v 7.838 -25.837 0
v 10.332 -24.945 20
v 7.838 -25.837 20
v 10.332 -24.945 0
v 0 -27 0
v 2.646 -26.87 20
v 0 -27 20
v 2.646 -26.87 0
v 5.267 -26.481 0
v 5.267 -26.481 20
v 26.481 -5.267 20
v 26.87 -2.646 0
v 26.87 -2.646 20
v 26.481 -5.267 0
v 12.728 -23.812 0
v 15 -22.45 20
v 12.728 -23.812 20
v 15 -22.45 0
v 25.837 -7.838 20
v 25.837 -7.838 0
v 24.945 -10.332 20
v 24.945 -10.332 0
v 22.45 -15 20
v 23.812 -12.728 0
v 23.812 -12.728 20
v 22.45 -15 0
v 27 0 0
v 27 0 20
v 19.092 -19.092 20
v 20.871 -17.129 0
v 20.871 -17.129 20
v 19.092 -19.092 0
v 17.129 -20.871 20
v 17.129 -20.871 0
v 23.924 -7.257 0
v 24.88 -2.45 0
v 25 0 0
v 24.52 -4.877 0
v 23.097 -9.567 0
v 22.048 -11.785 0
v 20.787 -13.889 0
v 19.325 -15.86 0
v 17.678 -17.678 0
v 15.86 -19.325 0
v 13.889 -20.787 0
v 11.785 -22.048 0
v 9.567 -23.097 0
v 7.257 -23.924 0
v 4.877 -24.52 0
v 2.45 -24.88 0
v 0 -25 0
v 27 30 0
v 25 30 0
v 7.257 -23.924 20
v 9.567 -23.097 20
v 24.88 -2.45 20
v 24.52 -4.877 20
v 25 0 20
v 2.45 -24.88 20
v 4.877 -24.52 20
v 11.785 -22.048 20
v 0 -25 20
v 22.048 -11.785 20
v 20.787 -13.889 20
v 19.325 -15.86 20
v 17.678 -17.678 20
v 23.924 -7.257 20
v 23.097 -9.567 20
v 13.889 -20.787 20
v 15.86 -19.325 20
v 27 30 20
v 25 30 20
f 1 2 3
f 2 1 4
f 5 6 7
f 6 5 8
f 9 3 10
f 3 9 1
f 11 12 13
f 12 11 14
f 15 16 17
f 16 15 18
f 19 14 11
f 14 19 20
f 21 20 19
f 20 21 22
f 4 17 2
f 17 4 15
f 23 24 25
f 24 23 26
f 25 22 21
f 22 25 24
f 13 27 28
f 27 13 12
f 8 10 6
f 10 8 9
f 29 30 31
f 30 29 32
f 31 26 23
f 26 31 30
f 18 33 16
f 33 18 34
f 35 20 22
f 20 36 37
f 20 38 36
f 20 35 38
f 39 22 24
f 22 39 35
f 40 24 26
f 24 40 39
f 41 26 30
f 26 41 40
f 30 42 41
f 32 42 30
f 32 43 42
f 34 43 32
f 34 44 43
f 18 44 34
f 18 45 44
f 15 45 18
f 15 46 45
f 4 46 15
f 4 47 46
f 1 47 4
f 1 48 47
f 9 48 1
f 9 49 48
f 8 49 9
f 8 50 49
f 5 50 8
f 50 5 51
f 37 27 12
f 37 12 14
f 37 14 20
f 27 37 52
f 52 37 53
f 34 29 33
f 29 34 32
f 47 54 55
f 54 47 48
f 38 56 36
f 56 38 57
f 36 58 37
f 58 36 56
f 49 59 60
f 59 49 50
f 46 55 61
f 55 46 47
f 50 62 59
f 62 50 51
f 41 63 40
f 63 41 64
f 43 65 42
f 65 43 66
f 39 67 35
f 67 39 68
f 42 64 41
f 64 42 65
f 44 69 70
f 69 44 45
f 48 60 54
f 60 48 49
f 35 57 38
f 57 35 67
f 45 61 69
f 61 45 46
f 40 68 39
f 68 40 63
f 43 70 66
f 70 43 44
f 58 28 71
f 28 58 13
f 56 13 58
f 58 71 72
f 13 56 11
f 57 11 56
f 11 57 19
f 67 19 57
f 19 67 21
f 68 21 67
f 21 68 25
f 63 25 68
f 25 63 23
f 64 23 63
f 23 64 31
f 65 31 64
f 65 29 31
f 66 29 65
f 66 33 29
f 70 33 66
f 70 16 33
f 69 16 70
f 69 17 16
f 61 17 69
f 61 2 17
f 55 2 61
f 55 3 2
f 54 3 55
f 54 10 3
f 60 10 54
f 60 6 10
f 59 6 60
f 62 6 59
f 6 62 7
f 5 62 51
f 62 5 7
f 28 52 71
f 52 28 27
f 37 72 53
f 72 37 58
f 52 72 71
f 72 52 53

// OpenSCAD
$fn=64;

// use <./helix_extrude.scad>


screwR=3.5/2;
screwHeadR=6/2;

screwD=117;

pt=2;

pa=25;


// color("blue") cube([150,300,0.1]);

// translate([0,50,120]) rotate([0,90+pa,90]) pipeSectionWithConnectors(200,27);

// startPlate();
// startPipe();
//bend();

shield();

module shield() {
intersection() {
translate([0,-30,0]) cube([30,30,20]);
difference() {
  cylinder(r=27,h=30);
  translate([0,0,-0.1]) cylinder(r=25,h=30.2);
}
}
translate([25,0,0]) cube([2,30,20]);

}

module bend() {

difference() {

union() {
translate([0,-30,2.5]) rotate([0,90+pa,0]) translate([0,0,-30]) pipeSectionWithConnectors(50,27,false);
translate([30,0,2.5]) rotate([0,0,90]) rotate([0,90+pa,0]) pipeSectionWithConnectors(30,27,true,false);
}

translate([0,-400,-200]) cube([400,400,400]);

}


rotate([0,0,-90]) rotate_extrude(angle=90)
      translate([30,0,0]) rotate(-90) pipe2d(27);
}

module pipeSectionWithConnectors(sectionLen,r,topConnector=true,bottomConnector=true) {
  pipeSection(sectionLen,r);
  if(topConnector) {
    translate([0,0,sectionLen-2]) groove(1,r);
  }
  if(bottomConnector) {
    translate([0,0,-5]) difference() {
      pipeSection(10,r+2);
      translate([0,0,2]) groove(1.2,r);
    }
    translate([-2,r-2,-5]) cube([2,4,10]);
    mirror([0,1,0]) translate([-2,r-2,-5]) cube([2,4,10]);
  }
}

// translate([70,60,130]) rotate([-90-pa,0,0]) rotate([0,0,90]) pipeSection(200,27);

module startPlate() {
  translate([0,0,140]) rotate([0,-90,0]) screwPlate();
  translate([29,8,140]) rotate([0,90+pa,90]) startPipe();
}

module startPipe() {
    pipeSection(50,27);
    translate([0,0,50-2]) groove(1,27);

    difference() {
      intersection() {
        sphere(r=27);
        translate([0,-30,-30]) cube([30,60,30]);
      }
      sphere(r=25);
    }

    translate([0,25,0]) cube([8,4,20]);
  
}

module pipeSection(sectionLen,r) {
  difference() {
    intersection() {
      cylinder(r=r,h=sectionLen);
      translate([0,-30,0]) cube([60,60,sectionLen]);
    }
    translate([0,0,-1]) cylinder(r=r-pt,h=sectionLen+2);
  }
}

module pipe2d(r) {
  difference() {
    intersection() {
      circle(r=r);
      translate([0,-30]) square([60,60]);
    }
    circle(r=r-pt);
  }
}

module groove(r1,r2) {
  ga=175;
  gd=180-ga;

  rotate([0,0,-90+gd/2]) {  
    rotate_extrude(angle=ga)
      translate([r2,0,0])
      circle(r=r1);
    translate([r2,0,0]) sphere(r=r1);
    rotate([0,0,ga]) translate([r2,0,0]) sphere(r=r1);
  }
}

module screwPlate() {
  po=12;
  difference() {
    union() {
      linear_extrude(height=2) translate([-po,0]) minkowski() {
        square([screwD+po,50]);
        circle(r=4); 
      }
      translate([0,25,2]) {
        cylinder(r1=7.2/2,r2=6.2/2,h=1.2);
        translate([screwD,0,0]) cylinder(r1=7.2/2,r2=6.2/2,h=1.2);
      }
    }
    translate([screwHeadR+1,0,-1]) cube([screwD-screwHeadR*2-2,50,10]);

    translate([0,25,-3]) {
      screw();
      translate([screwD,0,0]) screw();
    }
  }
}

module screw() {
  translate([0,0,4.9]) cylinder(r=screwR,h=10);
  cylinder(r=screwHeadR,h=5);
}
